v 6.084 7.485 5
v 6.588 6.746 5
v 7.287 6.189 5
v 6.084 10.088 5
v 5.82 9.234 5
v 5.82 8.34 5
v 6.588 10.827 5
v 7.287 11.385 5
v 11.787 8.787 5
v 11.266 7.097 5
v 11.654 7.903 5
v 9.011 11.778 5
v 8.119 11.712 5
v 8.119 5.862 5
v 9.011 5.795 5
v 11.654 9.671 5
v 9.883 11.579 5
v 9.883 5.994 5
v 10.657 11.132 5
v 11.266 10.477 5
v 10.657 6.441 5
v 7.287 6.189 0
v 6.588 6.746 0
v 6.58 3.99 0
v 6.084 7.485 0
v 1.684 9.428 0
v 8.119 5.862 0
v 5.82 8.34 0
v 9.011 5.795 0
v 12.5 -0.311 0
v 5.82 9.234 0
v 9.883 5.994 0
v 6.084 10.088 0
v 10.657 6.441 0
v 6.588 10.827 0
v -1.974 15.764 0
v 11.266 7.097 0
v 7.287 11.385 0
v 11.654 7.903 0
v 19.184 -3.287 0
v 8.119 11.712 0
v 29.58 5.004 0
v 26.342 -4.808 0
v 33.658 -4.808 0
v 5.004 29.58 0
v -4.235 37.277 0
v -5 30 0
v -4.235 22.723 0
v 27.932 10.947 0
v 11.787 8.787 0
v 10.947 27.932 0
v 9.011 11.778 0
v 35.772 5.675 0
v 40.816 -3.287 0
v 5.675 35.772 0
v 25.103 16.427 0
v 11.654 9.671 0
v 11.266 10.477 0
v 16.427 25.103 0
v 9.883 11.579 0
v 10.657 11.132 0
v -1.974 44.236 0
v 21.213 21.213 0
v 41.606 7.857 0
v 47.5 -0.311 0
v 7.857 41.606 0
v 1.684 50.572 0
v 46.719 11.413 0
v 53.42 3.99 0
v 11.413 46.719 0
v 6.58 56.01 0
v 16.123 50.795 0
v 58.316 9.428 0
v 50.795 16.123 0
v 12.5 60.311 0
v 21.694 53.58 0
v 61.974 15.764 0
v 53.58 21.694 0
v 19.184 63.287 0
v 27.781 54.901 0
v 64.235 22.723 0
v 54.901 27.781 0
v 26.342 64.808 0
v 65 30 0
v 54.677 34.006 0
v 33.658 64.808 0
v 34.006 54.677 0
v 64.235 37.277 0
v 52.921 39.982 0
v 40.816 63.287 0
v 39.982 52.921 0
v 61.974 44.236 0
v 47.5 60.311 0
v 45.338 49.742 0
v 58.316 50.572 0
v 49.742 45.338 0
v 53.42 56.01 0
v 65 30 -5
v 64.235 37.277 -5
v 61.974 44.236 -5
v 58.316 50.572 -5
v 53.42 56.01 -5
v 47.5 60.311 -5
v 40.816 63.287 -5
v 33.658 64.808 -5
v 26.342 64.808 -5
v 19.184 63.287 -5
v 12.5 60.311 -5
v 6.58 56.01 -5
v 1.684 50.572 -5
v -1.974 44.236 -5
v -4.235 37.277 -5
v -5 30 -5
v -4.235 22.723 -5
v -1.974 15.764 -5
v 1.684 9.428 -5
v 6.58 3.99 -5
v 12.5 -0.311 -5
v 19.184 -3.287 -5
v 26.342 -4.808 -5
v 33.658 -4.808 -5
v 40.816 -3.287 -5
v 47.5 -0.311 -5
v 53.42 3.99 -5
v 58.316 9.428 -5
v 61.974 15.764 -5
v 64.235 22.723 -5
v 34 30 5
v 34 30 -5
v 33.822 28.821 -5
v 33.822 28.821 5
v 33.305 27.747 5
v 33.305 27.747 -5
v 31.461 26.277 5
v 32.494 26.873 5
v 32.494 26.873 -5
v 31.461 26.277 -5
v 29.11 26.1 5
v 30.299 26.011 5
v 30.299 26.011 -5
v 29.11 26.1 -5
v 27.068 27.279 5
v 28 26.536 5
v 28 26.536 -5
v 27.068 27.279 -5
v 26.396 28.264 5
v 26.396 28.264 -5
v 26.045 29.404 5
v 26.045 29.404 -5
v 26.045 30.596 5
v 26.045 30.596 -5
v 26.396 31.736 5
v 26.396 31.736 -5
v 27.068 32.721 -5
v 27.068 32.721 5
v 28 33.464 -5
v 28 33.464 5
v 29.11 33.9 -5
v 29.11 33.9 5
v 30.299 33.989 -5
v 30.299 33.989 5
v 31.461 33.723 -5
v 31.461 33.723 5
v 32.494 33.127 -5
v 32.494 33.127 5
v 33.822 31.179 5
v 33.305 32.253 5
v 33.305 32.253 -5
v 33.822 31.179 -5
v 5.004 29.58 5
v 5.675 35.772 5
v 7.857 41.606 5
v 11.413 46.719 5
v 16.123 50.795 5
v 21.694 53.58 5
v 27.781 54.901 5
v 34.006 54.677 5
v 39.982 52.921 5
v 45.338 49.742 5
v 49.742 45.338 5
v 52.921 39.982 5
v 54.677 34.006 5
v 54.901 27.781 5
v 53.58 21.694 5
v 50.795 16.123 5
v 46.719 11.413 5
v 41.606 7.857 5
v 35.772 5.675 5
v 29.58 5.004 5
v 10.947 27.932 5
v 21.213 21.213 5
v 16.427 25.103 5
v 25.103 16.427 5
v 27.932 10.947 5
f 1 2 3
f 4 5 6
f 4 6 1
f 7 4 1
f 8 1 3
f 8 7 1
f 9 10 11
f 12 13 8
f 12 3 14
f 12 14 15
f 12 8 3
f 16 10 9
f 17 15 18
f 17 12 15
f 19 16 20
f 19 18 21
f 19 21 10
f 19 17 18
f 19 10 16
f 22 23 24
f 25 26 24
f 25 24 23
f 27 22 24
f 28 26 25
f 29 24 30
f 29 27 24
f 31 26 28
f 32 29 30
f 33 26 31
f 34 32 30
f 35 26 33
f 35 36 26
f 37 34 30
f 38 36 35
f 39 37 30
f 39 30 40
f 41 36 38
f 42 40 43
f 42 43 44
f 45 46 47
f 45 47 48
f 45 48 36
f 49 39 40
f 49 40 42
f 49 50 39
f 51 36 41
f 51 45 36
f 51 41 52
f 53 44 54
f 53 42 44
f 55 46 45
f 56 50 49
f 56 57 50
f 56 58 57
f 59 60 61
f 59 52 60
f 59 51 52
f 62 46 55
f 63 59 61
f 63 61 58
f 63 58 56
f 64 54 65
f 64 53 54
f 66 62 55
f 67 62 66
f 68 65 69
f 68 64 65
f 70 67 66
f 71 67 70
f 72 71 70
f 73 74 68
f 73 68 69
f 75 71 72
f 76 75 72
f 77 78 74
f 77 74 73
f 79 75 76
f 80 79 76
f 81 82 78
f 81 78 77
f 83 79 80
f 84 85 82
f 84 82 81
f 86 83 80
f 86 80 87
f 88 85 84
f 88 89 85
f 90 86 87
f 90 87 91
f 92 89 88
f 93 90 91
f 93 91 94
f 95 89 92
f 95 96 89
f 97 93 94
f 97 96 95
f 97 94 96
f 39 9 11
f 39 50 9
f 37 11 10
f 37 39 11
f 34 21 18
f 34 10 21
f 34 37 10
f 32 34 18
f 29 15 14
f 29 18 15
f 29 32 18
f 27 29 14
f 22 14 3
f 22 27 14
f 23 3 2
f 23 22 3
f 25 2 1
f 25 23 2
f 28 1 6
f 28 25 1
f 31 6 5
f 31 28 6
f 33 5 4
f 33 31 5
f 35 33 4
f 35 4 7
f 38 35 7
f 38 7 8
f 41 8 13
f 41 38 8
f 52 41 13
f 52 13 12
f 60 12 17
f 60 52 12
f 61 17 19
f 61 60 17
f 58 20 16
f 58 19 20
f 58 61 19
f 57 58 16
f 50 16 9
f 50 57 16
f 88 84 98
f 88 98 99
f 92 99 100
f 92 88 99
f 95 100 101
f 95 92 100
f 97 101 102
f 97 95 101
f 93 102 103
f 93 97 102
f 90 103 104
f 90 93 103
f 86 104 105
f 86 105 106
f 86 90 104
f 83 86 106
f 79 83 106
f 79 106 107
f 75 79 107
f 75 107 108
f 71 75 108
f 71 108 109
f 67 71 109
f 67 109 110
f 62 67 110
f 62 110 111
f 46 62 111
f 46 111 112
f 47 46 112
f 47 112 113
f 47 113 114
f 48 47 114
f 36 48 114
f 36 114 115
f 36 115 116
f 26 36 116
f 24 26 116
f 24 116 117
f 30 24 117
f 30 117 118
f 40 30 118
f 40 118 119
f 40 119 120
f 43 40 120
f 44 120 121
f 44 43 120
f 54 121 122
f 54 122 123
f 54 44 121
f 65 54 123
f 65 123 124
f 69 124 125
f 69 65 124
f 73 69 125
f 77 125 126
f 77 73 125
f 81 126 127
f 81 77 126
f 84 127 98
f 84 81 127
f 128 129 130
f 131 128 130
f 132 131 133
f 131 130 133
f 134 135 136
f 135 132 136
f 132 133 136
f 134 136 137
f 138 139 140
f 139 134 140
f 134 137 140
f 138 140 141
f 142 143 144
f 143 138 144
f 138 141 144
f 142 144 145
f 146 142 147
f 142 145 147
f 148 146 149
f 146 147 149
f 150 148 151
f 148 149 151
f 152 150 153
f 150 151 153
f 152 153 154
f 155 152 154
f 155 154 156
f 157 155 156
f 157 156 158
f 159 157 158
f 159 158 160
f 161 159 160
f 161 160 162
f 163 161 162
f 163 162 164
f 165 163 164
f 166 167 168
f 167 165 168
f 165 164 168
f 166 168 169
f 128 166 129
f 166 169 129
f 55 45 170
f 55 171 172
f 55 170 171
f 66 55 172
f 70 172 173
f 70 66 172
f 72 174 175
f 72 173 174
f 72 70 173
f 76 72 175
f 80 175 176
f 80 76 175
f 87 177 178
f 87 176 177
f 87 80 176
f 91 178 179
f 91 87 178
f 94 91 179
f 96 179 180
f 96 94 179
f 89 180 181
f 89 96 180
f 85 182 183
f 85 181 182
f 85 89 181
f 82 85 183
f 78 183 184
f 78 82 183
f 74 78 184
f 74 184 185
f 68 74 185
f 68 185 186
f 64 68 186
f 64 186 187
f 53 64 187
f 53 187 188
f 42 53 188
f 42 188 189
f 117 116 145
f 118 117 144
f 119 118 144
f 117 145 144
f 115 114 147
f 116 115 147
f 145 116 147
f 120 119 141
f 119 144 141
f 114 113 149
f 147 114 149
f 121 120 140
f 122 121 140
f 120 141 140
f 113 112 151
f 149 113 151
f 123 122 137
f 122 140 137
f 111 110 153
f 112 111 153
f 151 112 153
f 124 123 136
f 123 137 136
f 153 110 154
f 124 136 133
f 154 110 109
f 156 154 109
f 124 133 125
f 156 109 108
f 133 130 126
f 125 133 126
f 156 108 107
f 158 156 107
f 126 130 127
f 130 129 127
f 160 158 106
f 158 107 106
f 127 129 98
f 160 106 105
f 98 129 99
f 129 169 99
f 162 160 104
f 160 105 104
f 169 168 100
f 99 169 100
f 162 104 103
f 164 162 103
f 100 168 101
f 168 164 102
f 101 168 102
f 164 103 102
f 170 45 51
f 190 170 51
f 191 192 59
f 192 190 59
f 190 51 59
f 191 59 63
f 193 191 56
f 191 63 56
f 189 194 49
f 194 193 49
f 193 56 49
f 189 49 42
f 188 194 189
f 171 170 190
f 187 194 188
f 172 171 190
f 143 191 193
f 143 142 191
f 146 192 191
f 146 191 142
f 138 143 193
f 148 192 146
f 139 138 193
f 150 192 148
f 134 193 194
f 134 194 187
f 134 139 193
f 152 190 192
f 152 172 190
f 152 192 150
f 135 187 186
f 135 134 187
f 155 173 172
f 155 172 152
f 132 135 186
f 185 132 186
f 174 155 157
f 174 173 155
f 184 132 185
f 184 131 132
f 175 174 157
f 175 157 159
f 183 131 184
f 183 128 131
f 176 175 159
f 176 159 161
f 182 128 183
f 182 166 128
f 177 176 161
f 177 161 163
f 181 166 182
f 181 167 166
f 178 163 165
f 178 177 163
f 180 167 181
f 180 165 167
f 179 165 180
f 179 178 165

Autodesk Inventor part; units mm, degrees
ref_plane "YZ Plane" through (0, 0, 0) normal (1, 0, 0) x (0, 1, 0)
ref_plane "XZ Plane" through (0, 0, 0) normal (0, 1, 0) x (-1, 0, 0)
ref_plane "XY Plane" through (0, 0, 0) normal (0, 0, 1) x (1, 0, 0)
sketch "Sketch1" plane through (0, 0, 0) normal (0, 0, 1) x (1, 0, 0)
  line L0 (0, 0) -> (30, 0) construction
  line L1 (30, 0) -> (30, 30) construction
  line L2 (30, 30) -> (0, 30) construction
  line L3 (0, 11.9722) -> (0, 0) construction
  circle A0 centre (0, 0) radius 30 construction
  circle A1 centre (30, 30) radius 30 construction
  circle A2 centre (30, 30) radius 35
  arc A3 (29.5798, 5.0035) -> (5.0035, 29.5798) centre (30, 30) ccw
  arc A4 (29.5798, 5.0035) -> (5.0035, 29.5798) centre (0, 0) ccw
  line L4 (30, 30) -> (0, 0) construction
  circle A5 centre (30, 30) radius 4
  circle A6 centre (8.7868, 8.7868) radius 3
  dimension "d3" = 60
  dimension "d4" = 70
  dimension "d0" = 30
  dimension "d1" = 30
  dimension "d2" = 60
  dimension "d5" = 50
  dimension "d6" = 8
  dimension "d7" = 6
extrude "Extrusion1" add sketch "Sketch1" along normal blind 5 contours A4 A3 | A6
extrude "Extrusion2" add sketch "Sketch1" against normal blind 5 contours A2 | A4 A3 | A6
properties part number "Geneva_driver"
